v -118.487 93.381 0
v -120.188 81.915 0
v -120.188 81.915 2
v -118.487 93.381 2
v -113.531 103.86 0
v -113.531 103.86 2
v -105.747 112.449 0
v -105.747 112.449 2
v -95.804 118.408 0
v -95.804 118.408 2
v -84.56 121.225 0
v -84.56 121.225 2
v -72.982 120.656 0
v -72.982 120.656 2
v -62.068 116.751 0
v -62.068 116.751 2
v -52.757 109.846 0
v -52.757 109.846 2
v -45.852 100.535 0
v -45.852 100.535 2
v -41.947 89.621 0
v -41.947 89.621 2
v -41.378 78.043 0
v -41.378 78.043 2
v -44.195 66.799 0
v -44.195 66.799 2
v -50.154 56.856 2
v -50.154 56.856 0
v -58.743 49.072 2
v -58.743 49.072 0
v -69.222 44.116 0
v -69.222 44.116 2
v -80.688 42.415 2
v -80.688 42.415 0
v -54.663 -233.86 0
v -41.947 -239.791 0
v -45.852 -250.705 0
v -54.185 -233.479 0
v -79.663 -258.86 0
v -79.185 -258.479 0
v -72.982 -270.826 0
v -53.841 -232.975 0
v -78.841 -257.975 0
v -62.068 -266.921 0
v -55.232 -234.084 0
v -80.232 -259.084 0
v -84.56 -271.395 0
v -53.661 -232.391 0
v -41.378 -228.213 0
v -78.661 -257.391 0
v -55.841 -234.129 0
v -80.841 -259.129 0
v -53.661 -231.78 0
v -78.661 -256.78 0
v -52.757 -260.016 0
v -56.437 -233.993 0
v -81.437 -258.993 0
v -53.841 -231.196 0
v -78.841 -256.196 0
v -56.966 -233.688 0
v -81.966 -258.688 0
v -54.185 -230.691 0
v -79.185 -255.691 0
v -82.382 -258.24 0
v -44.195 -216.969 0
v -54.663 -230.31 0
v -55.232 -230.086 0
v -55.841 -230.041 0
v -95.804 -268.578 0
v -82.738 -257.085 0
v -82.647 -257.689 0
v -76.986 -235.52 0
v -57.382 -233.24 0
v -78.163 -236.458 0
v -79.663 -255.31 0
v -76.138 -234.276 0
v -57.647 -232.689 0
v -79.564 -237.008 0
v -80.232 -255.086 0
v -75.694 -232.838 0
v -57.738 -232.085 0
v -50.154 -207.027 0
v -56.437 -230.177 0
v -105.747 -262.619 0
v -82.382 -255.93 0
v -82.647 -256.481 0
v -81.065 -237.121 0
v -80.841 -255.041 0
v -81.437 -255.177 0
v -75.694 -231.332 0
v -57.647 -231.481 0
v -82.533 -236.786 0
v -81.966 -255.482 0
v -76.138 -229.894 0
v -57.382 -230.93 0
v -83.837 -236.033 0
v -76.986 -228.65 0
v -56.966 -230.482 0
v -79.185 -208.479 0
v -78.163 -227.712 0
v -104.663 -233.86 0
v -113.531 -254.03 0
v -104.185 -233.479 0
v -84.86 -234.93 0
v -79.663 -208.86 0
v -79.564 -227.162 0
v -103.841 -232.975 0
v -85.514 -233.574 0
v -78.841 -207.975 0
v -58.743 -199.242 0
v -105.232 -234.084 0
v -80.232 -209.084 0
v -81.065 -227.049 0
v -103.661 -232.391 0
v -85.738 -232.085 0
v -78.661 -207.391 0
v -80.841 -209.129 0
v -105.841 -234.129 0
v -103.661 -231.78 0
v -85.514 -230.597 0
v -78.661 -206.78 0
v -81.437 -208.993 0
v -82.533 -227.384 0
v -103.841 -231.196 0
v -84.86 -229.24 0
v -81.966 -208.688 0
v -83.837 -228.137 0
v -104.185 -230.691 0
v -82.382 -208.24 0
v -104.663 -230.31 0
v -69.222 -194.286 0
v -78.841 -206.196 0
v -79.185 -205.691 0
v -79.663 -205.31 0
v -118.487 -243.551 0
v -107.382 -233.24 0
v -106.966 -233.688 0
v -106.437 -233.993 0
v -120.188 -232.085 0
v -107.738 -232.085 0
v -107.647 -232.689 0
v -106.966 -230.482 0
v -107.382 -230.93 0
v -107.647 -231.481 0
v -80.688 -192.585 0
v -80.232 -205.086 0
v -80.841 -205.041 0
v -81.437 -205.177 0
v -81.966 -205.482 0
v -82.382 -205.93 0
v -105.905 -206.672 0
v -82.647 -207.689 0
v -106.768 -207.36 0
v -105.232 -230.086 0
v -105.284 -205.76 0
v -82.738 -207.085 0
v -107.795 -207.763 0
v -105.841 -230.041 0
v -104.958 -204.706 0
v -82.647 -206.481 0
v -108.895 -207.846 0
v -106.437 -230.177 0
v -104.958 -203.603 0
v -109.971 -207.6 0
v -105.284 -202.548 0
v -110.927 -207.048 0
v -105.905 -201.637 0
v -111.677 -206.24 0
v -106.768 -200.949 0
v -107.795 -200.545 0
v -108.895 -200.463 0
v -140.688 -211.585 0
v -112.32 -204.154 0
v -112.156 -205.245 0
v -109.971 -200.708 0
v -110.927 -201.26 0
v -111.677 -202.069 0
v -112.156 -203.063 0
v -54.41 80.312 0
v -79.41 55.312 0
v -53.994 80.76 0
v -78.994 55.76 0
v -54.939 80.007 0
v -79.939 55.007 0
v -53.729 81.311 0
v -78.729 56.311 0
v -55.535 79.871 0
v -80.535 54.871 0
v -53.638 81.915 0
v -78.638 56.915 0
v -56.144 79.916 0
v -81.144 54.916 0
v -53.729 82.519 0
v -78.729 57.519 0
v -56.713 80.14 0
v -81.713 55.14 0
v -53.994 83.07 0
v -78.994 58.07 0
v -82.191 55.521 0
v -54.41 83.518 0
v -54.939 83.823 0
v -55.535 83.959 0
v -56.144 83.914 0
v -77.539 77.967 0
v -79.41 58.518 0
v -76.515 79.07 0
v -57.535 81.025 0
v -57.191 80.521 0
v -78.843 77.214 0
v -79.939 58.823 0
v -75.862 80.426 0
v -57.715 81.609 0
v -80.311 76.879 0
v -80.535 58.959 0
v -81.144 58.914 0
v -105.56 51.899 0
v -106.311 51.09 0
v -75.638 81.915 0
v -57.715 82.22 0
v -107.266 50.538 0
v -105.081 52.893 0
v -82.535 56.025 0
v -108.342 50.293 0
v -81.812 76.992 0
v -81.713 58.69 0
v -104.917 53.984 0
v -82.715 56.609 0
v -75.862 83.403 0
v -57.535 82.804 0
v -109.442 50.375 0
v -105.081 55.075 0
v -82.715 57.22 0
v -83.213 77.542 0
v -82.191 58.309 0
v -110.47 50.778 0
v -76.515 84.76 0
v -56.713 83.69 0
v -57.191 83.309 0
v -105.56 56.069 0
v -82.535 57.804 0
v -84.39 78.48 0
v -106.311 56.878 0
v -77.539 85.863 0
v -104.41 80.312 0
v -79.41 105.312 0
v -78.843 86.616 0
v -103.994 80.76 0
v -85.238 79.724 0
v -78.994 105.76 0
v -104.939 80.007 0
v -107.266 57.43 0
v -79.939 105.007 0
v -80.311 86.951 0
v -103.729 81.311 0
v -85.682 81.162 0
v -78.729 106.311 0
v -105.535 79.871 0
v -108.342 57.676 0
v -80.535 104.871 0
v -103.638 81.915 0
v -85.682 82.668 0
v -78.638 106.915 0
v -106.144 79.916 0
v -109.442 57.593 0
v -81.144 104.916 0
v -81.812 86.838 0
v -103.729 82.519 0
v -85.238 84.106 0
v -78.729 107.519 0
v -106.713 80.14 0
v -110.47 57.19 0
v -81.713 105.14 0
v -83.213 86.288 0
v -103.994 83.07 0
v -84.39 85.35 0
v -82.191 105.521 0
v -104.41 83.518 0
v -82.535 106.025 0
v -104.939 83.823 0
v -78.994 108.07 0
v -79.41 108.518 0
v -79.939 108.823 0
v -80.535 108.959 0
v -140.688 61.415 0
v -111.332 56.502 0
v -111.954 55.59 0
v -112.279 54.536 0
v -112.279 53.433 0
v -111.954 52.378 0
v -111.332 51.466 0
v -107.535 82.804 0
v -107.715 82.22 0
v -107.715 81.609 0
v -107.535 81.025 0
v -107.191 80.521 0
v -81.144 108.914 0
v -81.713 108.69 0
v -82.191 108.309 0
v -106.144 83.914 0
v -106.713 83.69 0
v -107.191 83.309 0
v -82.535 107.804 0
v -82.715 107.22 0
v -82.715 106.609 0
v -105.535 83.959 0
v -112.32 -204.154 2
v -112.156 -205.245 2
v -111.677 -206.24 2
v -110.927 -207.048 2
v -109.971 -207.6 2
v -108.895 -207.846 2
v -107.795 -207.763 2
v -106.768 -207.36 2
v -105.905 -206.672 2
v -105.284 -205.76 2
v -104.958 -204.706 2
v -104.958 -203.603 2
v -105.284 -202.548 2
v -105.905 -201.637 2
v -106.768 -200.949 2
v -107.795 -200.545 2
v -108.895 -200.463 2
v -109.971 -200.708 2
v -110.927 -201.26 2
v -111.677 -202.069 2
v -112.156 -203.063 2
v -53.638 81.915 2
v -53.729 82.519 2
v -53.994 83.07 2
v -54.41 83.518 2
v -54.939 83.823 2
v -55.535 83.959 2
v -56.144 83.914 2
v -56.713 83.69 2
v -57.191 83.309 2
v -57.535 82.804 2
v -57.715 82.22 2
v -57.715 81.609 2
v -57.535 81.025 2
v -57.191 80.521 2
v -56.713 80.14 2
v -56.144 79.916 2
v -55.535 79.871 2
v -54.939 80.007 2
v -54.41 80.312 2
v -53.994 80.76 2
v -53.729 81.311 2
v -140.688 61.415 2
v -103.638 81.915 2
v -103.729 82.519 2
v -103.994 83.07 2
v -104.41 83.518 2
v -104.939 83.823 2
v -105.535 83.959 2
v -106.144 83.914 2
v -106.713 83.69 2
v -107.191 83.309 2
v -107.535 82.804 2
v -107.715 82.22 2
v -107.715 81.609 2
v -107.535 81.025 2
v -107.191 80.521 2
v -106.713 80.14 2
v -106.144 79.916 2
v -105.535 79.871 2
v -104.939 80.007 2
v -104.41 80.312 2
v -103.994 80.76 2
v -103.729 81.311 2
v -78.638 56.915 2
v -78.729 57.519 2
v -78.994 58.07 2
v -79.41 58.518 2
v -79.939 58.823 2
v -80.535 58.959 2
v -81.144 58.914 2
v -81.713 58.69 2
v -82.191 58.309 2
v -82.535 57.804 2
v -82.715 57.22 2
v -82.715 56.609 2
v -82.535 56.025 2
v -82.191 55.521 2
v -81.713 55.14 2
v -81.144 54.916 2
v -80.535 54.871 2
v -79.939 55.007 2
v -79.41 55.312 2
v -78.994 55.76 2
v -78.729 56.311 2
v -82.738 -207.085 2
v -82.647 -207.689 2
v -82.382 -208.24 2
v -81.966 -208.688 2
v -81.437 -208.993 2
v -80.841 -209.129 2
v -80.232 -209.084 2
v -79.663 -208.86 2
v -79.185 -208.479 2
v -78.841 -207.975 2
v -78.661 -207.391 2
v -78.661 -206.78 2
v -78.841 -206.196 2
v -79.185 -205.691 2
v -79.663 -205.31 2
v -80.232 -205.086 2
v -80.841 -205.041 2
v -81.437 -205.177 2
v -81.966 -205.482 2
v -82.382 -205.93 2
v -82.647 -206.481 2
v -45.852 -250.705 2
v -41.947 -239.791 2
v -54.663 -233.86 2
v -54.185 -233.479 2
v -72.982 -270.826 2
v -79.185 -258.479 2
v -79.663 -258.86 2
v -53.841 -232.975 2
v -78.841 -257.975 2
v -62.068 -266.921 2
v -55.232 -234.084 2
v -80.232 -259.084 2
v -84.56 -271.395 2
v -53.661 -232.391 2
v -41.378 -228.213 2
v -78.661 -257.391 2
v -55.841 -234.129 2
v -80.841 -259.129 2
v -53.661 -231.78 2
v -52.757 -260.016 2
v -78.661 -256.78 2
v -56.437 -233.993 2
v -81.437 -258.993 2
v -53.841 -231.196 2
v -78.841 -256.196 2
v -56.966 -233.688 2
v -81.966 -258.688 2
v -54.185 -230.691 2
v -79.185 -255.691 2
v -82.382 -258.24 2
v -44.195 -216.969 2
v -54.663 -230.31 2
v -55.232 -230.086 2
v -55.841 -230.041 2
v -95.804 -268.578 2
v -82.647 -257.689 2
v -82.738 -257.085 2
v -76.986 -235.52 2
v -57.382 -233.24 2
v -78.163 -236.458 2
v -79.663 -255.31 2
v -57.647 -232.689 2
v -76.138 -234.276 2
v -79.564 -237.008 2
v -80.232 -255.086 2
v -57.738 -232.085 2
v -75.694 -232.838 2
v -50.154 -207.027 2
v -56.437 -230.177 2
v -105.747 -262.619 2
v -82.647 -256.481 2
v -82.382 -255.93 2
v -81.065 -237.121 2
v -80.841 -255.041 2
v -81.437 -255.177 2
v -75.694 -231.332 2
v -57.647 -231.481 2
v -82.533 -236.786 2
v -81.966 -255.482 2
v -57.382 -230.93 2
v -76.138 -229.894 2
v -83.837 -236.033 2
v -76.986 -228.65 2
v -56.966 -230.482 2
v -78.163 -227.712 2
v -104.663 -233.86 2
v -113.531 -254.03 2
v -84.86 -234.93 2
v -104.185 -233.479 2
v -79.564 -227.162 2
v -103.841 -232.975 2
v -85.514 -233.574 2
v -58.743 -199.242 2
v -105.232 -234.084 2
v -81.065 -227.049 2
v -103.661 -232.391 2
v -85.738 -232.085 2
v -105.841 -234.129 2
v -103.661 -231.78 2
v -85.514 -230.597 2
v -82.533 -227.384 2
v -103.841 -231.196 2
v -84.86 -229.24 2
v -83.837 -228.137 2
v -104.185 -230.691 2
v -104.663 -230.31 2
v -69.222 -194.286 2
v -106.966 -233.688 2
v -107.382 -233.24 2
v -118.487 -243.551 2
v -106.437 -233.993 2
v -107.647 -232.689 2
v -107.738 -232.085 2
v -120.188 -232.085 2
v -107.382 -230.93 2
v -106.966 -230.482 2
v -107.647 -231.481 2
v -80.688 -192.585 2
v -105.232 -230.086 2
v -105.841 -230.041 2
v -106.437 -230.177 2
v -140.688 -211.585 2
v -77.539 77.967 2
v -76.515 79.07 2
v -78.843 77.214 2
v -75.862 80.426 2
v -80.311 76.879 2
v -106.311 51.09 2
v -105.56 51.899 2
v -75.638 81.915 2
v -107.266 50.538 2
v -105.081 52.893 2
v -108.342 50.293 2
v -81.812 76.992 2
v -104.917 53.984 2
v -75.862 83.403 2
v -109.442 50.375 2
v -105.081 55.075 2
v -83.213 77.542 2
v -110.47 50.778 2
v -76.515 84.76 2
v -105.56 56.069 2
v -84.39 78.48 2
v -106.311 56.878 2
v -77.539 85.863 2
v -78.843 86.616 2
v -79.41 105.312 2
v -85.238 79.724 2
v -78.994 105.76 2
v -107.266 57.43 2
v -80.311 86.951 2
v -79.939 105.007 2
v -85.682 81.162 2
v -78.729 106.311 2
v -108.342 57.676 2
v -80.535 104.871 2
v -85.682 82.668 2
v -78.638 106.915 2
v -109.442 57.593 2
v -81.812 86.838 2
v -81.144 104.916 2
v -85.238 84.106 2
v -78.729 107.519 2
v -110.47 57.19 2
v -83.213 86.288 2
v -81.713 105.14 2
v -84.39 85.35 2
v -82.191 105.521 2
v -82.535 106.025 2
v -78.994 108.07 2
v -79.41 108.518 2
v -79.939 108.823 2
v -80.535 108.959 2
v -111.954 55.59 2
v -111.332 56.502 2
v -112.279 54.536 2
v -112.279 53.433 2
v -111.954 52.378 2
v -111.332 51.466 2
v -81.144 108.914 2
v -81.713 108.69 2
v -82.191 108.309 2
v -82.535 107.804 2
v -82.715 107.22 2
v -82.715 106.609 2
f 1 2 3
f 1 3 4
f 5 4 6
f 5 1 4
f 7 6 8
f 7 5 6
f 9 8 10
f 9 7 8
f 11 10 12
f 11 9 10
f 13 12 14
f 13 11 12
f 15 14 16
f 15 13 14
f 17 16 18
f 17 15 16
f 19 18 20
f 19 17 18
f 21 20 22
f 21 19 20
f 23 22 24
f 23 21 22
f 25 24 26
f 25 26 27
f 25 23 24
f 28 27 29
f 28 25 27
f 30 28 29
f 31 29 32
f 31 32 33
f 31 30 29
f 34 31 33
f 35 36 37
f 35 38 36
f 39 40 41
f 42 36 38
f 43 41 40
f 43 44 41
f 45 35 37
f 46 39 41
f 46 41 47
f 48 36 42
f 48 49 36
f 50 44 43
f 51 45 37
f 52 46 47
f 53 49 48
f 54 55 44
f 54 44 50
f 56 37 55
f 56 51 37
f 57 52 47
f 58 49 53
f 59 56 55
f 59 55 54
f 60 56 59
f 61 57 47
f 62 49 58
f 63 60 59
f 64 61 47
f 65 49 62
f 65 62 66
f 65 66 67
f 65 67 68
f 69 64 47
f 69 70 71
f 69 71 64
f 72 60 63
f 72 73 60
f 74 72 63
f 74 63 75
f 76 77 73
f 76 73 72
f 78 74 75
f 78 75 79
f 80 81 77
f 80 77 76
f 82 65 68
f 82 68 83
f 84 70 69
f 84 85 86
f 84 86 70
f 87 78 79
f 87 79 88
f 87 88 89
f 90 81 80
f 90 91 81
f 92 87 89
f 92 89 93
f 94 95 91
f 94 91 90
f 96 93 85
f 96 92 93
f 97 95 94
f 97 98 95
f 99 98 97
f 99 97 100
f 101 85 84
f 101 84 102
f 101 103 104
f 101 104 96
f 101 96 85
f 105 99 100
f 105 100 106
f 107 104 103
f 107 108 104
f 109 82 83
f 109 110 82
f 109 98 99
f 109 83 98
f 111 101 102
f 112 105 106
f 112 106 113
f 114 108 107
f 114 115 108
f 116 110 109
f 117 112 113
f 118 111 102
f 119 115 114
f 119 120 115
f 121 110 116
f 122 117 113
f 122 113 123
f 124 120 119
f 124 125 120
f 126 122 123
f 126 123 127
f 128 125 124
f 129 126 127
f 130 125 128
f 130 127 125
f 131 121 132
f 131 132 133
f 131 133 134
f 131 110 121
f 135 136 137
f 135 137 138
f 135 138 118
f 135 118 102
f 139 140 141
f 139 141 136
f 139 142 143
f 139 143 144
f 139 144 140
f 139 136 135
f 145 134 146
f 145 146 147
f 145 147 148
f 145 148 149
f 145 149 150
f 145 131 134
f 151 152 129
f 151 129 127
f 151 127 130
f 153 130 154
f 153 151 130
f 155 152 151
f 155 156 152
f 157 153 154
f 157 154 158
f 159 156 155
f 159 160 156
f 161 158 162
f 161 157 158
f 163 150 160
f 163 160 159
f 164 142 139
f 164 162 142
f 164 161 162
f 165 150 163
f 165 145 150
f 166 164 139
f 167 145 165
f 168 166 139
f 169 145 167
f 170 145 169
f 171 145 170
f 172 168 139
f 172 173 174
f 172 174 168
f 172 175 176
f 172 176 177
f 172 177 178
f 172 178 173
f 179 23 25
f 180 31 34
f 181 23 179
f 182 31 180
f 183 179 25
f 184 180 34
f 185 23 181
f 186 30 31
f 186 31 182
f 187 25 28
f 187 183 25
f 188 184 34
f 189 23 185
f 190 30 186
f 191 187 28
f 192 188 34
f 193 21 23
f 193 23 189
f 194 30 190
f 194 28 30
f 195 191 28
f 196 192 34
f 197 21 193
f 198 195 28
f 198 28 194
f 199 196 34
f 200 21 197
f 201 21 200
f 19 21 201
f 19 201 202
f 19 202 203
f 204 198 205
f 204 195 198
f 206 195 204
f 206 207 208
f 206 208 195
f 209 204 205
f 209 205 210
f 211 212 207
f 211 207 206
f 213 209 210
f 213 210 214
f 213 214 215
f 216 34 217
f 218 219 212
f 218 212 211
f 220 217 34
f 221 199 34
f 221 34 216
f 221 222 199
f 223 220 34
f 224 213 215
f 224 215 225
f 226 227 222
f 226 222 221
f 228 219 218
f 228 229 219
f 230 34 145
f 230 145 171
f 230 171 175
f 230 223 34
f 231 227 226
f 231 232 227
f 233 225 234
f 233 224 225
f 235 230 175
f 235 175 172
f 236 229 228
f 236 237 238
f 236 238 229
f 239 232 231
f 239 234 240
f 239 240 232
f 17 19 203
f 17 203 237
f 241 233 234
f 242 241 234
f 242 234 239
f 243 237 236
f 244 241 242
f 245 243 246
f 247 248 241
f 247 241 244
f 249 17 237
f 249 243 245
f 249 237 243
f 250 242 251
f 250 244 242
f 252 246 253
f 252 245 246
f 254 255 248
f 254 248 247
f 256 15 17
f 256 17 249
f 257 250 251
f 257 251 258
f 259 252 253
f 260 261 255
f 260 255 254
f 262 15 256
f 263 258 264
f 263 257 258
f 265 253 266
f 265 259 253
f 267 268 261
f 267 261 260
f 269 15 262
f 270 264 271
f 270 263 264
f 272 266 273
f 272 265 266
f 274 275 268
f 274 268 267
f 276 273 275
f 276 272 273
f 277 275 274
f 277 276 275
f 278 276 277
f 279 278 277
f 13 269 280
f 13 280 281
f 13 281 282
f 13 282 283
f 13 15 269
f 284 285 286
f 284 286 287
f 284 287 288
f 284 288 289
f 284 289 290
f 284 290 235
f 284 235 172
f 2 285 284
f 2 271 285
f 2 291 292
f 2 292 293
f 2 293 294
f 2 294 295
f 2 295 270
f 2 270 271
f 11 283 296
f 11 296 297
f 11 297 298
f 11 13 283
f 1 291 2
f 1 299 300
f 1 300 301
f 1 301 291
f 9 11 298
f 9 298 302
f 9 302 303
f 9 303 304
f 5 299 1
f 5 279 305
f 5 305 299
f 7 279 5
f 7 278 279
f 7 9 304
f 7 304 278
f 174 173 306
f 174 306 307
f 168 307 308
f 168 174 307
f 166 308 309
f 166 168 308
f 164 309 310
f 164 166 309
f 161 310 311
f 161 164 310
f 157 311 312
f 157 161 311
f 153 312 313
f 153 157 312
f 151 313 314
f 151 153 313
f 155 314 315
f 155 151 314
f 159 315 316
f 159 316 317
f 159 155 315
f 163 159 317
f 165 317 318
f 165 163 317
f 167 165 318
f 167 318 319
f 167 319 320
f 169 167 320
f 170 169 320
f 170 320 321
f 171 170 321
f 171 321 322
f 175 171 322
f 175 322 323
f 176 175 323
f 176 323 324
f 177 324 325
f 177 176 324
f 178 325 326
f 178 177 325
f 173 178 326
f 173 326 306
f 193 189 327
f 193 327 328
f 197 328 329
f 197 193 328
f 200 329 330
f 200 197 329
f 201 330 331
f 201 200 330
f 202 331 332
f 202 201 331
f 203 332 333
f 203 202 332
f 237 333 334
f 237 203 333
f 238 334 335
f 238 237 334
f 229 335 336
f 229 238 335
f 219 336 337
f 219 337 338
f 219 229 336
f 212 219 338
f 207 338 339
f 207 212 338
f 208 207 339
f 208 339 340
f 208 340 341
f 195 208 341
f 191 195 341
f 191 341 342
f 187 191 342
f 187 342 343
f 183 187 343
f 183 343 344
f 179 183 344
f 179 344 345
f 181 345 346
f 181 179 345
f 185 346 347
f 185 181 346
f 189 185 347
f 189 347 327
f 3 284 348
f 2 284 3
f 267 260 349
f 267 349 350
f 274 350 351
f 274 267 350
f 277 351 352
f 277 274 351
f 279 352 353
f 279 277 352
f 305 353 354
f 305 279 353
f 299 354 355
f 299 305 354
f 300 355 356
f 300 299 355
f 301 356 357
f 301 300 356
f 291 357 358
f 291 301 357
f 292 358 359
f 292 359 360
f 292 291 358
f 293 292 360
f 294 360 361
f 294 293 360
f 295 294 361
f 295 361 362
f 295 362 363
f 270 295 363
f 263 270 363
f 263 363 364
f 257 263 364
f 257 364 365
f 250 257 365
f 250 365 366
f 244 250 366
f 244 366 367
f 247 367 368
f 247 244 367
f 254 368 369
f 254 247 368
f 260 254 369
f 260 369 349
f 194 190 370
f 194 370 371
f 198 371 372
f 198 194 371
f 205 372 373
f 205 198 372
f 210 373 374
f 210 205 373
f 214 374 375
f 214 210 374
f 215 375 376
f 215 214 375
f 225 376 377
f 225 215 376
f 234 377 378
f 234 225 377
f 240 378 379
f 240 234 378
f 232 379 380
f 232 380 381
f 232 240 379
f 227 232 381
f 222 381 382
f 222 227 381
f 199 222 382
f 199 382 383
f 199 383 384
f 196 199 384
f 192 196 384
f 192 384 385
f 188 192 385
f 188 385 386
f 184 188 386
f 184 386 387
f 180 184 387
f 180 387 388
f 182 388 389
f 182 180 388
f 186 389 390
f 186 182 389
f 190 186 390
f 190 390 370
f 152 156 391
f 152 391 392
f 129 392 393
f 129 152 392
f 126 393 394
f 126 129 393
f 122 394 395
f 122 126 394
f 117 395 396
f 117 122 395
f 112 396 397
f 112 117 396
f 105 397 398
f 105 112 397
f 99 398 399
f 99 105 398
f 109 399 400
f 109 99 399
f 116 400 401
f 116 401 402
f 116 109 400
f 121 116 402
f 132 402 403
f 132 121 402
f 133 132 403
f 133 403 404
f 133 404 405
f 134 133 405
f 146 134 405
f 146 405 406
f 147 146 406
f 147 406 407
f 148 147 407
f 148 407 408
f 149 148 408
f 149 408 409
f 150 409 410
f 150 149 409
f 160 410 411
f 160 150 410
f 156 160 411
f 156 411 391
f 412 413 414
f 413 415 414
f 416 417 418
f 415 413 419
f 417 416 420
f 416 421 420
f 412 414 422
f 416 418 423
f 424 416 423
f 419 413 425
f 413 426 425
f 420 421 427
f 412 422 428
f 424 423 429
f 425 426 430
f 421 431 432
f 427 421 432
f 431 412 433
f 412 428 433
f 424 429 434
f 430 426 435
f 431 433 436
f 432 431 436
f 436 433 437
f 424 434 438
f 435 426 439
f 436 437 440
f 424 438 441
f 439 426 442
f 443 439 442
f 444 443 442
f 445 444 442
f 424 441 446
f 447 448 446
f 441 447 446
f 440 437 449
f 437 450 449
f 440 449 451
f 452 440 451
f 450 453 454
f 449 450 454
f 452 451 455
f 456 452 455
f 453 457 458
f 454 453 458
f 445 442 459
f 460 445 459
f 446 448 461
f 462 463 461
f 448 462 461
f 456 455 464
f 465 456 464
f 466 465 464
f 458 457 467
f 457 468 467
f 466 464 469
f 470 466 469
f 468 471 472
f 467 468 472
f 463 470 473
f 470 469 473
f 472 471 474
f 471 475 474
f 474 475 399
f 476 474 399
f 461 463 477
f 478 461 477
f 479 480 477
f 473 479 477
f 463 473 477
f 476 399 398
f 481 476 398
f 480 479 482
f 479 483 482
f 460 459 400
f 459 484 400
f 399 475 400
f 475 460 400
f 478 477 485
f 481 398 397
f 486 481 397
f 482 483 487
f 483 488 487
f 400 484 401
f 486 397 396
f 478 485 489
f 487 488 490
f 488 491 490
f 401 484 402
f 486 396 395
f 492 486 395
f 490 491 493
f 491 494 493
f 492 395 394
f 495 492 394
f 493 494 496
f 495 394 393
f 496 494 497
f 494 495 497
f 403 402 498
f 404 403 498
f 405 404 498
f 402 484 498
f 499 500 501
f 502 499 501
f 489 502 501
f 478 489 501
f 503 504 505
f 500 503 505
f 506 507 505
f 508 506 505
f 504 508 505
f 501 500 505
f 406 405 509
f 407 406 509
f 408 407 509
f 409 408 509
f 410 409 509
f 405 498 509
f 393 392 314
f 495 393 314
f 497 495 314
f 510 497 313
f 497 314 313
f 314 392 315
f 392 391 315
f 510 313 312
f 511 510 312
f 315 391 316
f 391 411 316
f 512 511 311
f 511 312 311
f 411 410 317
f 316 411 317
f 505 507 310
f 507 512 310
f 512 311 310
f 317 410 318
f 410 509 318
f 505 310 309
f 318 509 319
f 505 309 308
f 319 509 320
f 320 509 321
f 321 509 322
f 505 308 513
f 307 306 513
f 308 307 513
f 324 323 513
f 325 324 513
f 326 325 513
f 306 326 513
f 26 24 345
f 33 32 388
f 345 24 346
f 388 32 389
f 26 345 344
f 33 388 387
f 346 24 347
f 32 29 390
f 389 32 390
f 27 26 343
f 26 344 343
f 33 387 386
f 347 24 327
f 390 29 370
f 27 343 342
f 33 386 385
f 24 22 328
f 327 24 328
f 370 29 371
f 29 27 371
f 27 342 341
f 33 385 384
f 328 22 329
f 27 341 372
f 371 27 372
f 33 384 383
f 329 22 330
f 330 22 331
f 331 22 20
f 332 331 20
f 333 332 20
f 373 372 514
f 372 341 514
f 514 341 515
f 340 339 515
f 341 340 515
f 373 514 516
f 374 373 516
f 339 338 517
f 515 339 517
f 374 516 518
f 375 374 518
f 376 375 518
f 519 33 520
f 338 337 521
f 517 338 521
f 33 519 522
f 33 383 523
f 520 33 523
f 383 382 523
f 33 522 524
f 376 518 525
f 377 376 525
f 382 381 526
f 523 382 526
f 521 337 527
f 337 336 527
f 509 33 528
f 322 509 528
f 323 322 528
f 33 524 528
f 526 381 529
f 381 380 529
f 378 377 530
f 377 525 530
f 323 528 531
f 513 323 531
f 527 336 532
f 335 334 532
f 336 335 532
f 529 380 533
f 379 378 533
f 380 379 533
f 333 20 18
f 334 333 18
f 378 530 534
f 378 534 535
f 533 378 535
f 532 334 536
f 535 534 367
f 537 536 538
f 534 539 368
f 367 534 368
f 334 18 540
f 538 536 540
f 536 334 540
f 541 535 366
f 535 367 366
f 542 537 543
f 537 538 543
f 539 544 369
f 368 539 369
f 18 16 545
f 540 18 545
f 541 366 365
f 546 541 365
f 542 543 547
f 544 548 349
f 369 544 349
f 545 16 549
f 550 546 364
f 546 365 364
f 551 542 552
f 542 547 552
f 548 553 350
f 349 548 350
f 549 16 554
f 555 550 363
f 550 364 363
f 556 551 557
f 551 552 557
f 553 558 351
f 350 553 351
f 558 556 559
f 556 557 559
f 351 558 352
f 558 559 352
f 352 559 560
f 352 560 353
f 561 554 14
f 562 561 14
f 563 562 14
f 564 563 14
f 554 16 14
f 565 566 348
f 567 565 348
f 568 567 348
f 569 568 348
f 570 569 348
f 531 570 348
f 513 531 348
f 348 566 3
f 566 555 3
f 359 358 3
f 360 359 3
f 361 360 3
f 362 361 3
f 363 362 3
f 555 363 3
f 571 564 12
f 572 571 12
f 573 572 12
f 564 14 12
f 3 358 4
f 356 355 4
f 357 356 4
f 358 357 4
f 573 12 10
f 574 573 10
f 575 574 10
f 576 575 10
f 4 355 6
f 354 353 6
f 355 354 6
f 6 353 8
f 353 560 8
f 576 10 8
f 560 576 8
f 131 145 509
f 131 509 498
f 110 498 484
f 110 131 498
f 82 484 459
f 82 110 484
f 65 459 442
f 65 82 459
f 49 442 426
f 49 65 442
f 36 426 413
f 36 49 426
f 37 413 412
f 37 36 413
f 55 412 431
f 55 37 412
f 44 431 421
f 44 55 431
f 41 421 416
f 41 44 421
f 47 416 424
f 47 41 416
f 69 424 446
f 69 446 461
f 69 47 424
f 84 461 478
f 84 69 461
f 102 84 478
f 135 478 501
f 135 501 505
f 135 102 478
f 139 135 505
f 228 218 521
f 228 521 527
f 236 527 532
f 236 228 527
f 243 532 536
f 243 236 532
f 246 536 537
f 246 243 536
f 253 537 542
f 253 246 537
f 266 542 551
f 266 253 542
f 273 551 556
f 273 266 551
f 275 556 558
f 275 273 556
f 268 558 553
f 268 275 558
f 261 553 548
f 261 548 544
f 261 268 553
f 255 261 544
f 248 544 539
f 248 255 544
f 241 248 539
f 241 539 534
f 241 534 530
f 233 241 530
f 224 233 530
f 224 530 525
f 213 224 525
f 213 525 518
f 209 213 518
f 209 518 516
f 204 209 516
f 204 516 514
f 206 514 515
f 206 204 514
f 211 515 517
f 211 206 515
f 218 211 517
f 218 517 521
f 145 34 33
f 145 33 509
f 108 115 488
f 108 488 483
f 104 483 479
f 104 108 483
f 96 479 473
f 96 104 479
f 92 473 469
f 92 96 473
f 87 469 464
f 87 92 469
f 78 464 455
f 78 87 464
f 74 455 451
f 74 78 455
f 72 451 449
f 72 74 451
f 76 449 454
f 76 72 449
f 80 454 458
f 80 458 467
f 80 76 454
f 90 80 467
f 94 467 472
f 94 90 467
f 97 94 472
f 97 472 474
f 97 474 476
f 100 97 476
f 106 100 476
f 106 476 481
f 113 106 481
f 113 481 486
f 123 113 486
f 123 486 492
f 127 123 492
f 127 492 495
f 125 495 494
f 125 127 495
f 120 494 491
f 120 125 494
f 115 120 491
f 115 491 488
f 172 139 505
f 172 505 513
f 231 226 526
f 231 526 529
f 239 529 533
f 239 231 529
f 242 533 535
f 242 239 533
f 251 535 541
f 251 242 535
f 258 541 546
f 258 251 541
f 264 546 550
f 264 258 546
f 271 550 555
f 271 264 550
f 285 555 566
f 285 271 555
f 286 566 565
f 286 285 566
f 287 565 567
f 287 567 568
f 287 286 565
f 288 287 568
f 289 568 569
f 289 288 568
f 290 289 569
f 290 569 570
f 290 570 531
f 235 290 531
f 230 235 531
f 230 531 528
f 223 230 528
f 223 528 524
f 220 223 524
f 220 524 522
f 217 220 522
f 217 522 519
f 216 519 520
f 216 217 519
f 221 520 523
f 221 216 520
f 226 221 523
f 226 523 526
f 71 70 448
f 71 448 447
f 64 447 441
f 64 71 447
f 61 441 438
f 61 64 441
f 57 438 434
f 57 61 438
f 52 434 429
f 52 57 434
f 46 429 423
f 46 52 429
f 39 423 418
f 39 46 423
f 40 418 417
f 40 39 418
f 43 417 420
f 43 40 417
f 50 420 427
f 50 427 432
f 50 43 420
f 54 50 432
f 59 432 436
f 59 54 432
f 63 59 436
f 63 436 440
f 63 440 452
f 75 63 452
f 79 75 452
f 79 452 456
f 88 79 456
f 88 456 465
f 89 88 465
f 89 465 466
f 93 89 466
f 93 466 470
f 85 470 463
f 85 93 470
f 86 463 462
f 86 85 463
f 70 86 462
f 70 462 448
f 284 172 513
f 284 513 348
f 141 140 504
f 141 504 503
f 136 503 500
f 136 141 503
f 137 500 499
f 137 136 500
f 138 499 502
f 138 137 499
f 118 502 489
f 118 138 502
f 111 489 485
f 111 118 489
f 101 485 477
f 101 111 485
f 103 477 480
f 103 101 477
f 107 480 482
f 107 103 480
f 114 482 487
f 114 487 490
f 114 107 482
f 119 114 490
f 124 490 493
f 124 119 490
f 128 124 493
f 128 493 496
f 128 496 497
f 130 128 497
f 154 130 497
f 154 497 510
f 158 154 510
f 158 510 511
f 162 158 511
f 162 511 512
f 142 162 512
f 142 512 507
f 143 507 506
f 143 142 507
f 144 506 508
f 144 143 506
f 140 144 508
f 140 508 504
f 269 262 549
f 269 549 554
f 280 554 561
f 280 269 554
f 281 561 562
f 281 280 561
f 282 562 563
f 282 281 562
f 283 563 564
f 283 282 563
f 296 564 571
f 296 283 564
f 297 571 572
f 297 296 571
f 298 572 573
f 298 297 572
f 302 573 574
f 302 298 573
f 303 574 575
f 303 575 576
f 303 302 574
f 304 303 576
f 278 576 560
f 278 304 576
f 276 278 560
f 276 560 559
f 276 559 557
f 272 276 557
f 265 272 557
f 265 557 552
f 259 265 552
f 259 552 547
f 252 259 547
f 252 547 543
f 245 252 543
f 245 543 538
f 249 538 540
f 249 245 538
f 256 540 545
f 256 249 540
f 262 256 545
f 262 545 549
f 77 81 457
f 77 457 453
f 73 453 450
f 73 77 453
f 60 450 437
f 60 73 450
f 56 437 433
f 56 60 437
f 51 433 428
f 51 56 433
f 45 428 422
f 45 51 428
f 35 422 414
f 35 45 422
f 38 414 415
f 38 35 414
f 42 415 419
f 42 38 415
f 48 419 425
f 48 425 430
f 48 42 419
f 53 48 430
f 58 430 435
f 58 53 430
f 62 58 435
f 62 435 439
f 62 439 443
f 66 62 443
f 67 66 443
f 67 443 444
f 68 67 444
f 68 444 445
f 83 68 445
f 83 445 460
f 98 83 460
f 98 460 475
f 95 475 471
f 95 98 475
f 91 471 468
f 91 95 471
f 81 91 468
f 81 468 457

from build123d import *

# Parameters (mm, degrees)
SKETCH_1_R      = 5.05
SKETCH_1_R_2    = 2.05
SKETCH_1_R_3    = 3.701732688
EXTRUDE_1_DEPTH = 2


with BuildPart() as part:
    # 草图1 → 凸台-拉伸1 (new body)
    with BuildSketch(Plane.XY):
        with BuildLine():
            Line((-80.687991051, 42.414942906), (-80.687991051, -192.585057094))
            ThreePointArc((-80.687991051, -192.585057094), (-52.757273194, -260.015774951), (-120.187991051, -232.085057094))
            Line((-120.187991051, -232.085057094), (-140.687991051, -211.585057094))
            Line((-140.687991051, -211.585057094), (-140.687991051, 61.414942906))
            Line((-140.687991051, 61.414942906), (-120.187991051, 81.914942906))
            ThreePointArc((-120.187991051, 81.914942906), (-52.757273194, 109.845660763), (-80.687991051, 42.414942906))
        make_face()
        with Locations((-80.687991051, 81.914942906)):
            Circle(SKETCH_1_R, mode=Mode.SUBTRACT)
        with Locations((-80.687991051, 56.914942906)):
            Circle(SKETCH_1_R_2, mode=Mode.SUBTRACT)
        with Locations((-108.618708908, 53.984225049)):
            Circle(SKETCH_1_R_3, mode=Mode.SUBTRACT)
        with Locations((-55.687991051, 81.914942906)):
            Circle(SKETCH_1_R_2, mode=Mode.SUBTRACT)
        with Locations((-105.687991051, 81.914942906)):
            Circle(SKETCH_1_R_2, mode=Mode.SUBTRACT)
        with Locations((-80.687991051, 106.914942906)):
            Circle(SKETCH_1_R_2, mode=Mode.SUBTRACT)
        with Locations(Location((-80.687991051, -257.085057094, 0), (0, 0, 180))):
            Circle(SKETCH_1_R_2, mode=Mode.SUBTRACT)
        with Locations(Location((-105.687991051, -232.085057094, 0), (0, 0, 180))):
            Circle(SKETCH_1_R_2, mode=Mode.SUBTRACT)
        with Locations(Location((-55.687991051, -232.085057094, 0), (0, 0, 180))):
            Circle(SKETCH_1_R_2, mode=Mode.SUBTRACT)
        with Locations(Location((-108.618708908, -204.154339237, 0), (0, 0, 180))):
            Circle(SKETCH_1_R_3, mode=Mode.SUBTRACT)
        with Locations(Location((-80.687991051, -207.085057094, 0), (0, 0, 180))):
            Circle(SKETCH_1_R_2, mode=Mode.SUBTRACT)
        with Locations(Location((-80.687991051, -232.085057094, 0), (0, 0, 180))):
            Circle(SKETCH_1_R, mode=Mode.SUBTRACT)
    extrude(amount=EXTRUDE_1_DEPTH)


solid = part.part
